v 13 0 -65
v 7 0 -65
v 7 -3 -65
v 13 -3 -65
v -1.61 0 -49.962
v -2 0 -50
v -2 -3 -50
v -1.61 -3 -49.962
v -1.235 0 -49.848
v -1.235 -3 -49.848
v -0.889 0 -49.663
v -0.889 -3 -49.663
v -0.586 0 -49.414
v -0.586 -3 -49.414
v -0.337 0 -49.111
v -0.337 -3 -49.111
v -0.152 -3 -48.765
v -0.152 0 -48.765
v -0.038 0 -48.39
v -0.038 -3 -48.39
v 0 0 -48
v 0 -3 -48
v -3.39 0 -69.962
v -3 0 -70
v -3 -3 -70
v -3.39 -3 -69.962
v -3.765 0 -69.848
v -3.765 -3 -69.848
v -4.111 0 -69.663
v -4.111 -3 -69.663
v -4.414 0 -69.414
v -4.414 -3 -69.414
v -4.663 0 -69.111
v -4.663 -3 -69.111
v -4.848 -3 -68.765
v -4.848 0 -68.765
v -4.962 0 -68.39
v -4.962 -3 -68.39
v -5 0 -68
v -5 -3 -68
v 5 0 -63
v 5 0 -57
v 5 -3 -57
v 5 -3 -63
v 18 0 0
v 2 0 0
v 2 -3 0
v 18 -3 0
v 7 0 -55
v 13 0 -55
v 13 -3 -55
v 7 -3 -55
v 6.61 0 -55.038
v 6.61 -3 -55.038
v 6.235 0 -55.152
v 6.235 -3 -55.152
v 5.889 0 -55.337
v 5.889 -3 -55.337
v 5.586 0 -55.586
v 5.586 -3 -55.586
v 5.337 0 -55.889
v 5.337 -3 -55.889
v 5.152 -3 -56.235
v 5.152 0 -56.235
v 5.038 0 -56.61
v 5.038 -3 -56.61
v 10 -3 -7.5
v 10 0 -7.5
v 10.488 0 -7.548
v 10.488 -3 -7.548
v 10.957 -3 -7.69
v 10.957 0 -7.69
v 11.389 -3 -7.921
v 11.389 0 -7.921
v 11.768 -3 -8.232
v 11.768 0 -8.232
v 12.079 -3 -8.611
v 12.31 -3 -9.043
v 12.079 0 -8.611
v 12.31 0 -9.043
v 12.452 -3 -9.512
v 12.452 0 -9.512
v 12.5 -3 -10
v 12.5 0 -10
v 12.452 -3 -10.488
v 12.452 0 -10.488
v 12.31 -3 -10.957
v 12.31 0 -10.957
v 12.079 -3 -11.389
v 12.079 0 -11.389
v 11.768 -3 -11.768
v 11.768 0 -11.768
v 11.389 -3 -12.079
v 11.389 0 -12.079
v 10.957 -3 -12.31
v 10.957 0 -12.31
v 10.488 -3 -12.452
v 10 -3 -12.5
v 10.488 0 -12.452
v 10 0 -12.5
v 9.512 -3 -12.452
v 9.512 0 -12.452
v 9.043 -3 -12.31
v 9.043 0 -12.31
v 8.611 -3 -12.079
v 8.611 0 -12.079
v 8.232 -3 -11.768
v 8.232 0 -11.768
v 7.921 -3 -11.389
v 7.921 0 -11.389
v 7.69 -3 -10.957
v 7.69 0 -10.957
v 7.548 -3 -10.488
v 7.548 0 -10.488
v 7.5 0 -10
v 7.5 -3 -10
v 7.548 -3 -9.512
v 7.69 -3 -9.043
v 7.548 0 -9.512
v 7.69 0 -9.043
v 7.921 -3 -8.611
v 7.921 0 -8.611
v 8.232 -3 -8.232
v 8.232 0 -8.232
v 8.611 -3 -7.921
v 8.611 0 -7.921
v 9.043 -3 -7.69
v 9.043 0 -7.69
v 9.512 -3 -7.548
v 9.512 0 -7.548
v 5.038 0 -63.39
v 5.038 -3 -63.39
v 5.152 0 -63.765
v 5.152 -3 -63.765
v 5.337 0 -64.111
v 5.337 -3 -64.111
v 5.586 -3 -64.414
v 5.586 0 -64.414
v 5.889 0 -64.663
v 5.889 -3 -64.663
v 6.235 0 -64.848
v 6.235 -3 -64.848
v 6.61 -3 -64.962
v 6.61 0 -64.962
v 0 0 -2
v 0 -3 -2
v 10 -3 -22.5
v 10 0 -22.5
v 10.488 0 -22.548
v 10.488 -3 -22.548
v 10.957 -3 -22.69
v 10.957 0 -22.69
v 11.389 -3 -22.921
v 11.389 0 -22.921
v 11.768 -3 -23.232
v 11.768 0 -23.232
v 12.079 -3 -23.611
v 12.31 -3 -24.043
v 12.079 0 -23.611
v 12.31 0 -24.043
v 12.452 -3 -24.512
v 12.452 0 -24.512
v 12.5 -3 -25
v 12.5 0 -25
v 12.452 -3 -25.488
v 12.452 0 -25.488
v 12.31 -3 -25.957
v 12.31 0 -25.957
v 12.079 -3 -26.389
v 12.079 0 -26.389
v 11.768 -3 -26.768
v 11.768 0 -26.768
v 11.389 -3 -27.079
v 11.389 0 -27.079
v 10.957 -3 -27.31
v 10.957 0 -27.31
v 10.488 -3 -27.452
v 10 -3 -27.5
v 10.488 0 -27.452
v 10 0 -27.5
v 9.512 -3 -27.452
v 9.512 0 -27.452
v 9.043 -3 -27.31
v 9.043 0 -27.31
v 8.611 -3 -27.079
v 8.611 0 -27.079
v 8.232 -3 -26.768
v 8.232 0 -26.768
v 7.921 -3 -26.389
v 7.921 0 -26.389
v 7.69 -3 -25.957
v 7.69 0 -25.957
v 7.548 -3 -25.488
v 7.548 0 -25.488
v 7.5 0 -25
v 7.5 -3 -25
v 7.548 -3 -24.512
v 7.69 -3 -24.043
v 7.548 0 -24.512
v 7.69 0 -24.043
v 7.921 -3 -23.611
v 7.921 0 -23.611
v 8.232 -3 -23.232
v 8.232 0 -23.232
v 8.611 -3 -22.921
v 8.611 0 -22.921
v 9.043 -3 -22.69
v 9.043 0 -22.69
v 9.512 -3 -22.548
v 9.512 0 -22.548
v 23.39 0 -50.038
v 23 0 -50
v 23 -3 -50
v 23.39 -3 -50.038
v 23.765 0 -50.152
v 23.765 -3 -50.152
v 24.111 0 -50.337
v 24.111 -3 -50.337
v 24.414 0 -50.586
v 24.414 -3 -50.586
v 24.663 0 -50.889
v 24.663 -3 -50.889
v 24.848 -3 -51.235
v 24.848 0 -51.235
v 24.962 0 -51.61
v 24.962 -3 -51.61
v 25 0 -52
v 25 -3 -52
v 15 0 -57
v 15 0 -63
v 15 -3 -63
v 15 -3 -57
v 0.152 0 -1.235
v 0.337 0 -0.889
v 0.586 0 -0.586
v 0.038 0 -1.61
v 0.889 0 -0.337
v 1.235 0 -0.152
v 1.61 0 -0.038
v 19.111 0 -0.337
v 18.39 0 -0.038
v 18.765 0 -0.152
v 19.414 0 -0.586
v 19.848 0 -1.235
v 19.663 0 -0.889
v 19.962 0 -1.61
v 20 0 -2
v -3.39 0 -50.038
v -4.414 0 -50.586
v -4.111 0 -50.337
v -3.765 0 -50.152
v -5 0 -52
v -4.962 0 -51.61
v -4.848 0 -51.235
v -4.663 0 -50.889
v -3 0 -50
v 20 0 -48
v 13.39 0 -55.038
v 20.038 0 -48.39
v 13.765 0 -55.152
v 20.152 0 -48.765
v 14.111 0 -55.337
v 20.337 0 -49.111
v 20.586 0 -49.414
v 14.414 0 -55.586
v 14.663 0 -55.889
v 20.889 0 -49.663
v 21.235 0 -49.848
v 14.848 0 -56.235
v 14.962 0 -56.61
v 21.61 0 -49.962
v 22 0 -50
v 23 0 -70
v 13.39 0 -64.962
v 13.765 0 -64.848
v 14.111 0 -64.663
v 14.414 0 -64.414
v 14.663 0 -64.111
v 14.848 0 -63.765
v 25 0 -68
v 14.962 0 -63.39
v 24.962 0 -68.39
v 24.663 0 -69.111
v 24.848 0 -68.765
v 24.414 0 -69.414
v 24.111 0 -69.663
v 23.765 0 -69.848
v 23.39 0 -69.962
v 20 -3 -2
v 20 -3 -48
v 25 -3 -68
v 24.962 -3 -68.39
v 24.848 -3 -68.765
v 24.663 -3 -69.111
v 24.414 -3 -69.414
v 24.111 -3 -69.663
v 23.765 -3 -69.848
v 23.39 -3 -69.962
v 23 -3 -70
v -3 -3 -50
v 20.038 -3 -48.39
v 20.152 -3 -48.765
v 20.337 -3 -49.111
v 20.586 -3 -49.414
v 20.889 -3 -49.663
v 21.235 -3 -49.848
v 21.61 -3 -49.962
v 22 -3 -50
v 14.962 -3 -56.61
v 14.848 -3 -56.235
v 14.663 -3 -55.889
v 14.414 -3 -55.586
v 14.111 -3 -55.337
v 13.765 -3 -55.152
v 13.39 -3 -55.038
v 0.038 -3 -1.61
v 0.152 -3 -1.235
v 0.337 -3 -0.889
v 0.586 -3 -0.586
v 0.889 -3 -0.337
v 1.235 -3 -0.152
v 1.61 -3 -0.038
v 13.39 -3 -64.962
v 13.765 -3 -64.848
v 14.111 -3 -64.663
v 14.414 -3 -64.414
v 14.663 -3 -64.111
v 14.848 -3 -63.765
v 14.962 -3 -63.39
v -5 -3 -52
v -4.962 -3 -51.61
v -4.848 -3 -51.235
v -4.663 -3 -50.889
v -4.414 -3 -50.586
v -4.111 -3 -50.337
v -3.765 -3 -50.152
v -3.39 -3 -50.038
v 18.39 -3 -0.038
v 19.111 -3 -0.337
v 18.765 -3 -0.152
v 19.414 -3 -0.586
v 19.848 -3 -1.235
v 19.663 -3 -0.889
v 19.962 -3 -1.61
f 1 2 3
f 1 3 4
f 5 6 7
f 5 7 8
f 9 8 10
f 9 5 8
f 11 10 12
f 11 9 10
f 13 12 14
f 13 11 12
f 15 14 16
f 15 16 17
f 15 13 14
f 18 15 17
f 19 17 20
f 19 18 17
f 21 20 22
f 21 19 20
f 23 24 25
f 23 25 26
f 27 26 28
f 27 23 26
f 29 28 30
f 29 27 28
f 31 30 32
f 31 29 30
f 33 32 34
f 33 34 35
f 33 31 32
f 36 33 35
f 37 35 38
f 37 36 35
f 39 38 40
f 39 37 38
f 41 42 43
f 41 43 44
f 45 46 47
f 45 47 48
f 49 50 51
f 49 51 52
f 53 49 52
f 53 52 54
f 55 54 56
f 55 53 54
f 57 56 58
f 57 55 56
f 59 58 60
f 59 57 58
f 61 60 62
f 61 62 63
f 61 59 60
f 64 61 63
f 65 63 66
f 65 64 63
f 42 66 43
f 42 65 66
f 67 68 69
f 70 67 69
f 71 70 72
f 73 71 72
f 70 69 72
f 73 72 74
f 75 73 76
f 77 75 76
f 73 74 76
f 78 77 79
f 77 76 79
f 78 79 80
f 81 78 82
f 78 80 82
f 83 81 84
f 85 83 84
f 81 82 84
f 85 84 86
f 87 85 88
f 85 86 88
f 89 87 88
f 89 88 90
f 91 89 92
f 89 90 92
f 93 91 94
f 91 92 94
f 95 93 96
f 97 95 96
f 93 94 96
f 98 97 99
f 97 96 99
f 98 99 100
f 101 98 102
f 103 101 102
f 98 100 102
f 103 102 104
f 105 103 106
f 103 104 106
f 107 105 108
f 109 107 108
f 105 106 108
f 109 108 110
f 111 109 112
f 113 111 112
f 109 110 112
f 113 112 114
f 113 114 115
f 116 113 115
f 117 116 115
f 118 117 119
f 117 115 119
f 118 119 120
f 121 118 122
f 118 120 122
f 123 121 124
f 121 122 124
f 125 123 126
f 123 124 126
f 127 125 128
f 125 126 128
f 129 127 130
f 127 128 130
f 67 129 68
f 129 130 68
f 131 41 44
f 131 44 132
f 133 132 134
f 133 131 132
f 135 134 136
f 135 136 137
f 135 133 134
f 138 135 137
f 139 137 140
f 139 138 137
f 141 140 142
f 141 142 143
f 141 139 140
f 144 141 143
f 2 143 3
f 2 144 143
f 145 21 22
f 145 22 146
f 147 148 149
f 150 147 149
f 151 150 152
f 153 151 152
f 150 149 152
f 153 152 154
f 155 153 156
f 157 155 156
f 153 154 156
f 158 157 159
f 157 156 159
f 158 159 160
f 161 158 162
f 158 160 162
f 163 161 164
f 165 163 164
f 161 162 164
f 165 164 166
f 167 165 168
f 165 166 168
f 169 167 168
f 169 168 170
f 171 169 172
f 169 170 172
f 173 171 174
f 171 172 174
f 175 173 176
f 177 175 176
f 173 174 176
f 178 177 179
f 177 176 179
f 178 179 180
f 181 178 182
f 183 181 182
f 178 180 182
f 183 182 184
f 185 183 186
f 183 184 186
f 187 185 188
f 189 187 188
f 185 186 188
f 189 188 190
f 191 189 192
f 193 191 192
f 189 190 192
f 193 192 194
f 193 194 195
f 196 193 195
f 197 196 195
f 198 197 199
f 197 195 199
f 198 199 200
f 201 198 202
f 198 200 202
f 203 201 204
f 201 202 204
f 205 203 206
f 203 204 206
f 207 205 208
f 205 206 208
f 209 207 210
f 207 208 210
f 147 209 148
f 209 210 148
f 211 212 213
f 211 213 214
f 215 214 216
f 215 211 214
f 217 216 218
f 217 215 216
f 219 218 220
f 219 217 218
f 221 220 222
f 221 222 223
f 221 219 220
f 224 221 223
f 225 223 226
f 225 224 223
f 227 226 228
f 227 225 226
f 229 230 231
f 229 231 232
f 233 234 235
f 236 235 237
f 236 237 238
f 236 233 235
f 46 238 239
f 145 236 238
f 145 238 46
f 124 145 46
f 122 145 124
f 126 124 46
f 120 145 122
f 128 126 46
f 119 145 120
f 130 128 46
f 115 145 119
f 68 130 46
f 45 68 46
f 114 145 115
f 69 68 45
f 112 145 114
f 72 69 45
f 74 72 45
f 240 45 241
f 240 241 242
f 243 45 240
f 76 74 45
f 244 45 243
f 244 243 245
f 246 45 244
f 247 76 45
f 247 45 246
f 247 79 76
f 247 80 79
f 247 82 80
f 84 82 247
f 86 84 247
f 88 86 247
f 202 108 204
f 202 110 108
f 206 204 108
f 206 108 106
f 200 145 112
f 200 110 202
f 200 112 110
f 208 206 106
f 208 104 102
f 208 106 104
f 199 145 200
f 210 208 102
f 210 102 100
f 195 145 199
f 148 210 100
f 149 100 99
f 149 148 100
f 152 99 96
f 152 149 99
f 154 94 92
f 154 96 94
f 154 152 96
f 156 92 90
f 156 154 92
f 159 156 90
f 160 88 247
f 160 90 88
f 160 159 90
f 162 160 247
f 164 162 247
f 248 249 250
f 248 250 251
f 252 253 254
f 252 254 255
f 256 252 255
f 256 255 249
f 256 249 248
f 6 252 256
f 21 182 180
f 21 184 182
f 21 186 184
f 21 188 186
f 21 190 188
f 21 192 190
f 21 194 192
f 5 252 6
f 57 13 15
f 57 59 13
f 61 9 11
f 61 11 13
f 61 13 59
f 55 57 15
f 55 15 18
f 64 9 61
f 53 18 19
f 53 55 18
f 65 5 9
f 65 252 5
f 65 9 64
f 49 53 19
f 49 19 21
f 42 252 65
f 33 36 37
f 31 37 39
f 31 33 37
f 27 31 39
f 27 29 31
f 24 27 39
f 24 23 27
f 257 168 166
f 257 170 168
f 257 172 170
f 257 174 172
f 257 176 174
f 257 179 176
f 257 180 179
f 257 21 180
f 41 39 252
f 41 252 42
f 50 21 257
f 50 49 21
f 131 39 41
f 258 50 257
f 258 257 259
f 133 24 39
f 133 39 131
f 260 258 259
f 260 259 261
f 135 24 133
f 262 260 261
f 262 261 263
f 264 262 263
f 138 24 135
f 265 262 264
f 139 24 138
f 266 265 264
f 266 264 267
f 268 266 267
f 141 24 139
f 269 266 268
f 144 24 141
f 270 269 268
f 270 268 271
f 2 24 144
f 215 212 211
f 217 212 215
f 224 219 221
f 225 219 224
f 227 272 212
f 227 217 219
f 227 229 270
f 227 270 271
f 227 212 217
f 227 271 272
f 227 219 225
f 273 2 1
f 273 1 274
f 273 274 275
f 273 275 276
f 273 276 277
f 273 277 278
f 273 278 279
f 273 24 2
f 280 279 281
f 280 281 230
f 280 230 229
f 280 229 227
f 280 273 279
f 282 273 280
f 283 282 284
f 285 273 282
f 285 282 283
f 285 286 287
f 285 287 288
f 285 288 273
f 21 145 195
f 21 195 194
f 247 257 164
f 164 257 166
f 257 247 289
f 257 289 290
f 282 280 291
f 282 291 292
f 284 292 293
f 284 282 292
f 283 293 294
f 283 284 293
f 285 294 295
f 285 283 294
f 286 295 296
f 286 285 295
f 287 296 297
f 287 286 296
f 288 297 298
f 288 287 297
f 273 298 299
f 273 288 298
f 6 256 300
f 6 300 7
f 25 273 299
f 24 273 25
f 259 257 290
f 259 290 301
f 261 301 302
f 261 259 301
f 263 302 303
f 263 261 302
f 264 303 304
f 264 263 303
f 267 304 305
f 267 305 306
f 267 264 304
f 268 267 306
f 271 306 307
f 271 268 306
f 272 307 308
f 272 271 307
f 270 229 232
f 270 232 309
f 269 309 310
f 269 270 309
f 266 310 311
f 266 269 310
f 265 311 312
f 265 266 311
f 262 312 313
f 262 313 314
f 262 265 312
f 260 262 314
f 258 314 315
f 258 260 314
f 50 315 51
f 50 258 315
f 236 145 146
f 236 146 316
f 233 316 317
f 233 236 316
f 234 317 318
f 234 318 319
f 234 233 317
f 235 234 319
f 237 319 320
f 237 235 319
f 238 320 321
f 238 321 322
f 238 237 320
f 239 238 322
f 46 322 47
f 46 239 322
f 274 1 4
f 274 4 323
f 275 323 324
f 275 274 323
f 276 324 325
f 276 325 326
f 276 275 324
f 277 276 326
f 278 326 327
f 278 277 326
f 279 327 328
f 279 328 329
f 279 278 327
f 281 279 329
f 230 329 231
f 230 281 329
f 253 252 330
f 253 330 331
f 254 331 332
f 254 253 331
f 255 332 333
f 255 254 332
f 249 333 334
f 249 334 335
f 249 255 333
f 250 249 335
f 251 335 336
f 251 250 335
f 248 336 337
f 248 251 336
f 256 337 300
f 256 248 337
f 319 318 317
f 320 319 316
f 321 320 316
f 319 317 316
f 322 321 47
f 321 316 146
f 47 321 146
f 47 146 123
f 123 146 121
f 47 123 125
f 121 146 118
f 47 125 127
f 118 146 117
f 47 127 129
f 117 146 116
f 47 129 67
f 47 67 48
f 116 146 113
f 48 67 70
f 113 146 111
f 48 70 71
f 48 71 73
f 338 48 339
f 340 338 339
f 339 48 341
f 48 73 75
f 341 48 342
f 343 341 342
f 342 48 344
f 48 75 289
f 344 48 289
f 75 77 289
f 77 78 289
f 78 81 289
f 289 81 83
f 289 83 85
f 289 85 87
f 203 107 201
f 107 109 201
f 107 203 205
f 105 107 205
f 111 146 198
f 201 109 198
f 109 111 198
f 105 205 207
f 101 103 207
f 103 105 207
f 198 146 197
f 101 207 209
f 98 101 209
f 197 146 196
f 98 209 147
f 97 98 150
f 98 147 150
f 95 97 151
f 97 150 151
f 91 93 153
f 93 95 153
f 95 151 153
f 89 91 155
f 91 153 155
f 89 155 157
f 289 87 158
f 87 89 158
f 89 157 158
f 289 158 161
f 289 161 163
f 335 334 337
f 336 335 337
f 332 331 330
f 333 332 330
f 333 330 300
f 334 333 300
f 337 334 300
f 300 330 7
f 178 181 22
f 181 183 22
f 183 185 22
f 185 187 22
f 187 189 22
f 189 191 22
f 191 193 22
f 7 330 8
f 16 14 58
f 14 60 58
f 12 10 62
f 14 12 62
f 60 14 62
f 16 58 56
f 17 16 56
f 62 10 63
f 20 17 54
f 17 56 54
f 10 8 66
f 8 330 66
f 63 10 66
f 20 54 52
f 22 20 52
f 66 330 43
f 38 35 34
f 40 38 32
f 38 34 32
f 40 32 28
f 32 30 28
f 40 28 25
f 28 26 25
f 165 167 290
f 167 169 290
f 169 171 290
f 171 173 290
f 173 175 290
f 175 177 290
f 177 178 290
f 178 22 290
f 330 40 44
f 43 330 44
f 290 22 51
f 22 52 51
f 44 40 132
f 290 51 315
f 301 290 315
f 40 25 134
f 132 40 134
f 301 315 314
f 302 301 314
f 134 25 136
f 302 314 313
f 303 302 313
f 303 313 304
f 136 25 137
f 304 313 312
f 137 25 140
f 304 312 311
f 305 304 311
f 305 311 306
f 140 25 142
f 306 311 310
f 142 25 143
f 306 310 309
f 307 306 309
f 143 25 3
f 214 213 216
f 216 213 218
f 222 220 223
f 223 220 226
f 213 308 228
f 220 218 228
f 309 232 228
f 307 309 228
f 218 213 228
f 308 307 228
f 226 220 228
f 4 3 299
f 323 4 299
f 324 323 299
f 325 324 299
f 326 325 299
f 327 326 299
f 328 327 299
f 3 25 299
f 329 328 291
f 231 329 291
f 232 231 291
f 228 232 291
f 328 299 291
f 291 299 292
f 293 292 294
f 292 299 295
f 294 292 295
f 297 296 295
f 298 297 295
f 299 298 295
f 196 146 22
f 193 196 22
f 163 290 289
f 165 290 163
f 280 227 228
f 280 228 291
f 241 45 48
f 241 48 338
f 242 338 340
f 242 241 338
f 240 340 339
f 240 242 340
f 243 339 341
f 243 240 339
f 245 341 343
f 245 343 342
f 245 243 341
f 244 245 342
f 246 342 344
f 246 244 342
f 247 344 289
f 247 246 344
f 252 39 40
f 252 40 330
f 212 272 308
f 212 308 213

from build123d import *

# Parameters (mm, degrees)
SKETCH_1_R      = 2.5
EXTRUDE_1_DEPTH = 3


with BuildPart() as part:
    # 草图1 → 凸台-拉伸1 (new body)
    with BuildSketch(Plane(origin=(0, 0, 0), x_dir=(1, 0, 0), z_dir=(0, 1, 0))):
        with BuildLine():
            Line((22, 50), (23, 50))
            ThreePointArc((23, 50), (24.414213562, 50.585786438), (25, 52))
            Line((25, 52), (25, 68))
            ThreePointArc((25, 68), (24.414213562, 69.414213562), (23, 70))
            Line((23, 70), (-3, 70))
            ThreePointArc((-3, 70), (-4.414213562, 69.414213562), (-5, 68))
            Line((-5, 68), (-5, 52))
            ThreePointArc((-5, 52), (-4.414213562, 50.585786438), (-3, 50))
            Line((-3, 50), (-2, 50))
            ThreePointArc((-2, 50), (-0.585786438, 49.414213562), (0, 48))
            Line((0, 48), (0, 2))
            ThreePointArc((0, 2), (0.585786438, 0.585786438), (2, 0))
            Line((2, 0), (18, 0))
            ThreePointArc((18, 0), (19.414213562, 0.585786438), (20, 2))
            Line((20, 2), (20, 48))
            ThreePointArc((20, 48), (20.585786438, 49.414213562), (22, 50))
        make_face()
        with Locations(Location((10, 25, 0), (0, 0, 270))):
            Circle(SKETCH_1_R, mode=Mode.SUBTRACT)
        with Locations(Location((10, 10, 0), (0, 0, 270))):
            Circle(SKETCH_1_R, mode=Mode.SUBTRACT)
        with BuildLine():
            Line((7, 65), (13, 65))
            ThreePointArc((13, 65), (14.414213562, 64.414213562), (15, 63))
            Line((15, 63), (15, 57))
            ThreePointArc((15, 57), (14.414213562, 55.585786438), (13, 55))
            Line((13, 55), (7, 55))
            ThreePointArc((7, 55), (5.585786438, 55.585786438), (5, 57))
            Line((5, 57), (5, 63))
            ThreePointArc((5, 63), (5.585786438, 64.414213562), (7, 65))
        make_face(mode=Mode.SUBTRACT)
    extrude(amount=-EXTRUDE_1_DEPTH)


solid = part.part
